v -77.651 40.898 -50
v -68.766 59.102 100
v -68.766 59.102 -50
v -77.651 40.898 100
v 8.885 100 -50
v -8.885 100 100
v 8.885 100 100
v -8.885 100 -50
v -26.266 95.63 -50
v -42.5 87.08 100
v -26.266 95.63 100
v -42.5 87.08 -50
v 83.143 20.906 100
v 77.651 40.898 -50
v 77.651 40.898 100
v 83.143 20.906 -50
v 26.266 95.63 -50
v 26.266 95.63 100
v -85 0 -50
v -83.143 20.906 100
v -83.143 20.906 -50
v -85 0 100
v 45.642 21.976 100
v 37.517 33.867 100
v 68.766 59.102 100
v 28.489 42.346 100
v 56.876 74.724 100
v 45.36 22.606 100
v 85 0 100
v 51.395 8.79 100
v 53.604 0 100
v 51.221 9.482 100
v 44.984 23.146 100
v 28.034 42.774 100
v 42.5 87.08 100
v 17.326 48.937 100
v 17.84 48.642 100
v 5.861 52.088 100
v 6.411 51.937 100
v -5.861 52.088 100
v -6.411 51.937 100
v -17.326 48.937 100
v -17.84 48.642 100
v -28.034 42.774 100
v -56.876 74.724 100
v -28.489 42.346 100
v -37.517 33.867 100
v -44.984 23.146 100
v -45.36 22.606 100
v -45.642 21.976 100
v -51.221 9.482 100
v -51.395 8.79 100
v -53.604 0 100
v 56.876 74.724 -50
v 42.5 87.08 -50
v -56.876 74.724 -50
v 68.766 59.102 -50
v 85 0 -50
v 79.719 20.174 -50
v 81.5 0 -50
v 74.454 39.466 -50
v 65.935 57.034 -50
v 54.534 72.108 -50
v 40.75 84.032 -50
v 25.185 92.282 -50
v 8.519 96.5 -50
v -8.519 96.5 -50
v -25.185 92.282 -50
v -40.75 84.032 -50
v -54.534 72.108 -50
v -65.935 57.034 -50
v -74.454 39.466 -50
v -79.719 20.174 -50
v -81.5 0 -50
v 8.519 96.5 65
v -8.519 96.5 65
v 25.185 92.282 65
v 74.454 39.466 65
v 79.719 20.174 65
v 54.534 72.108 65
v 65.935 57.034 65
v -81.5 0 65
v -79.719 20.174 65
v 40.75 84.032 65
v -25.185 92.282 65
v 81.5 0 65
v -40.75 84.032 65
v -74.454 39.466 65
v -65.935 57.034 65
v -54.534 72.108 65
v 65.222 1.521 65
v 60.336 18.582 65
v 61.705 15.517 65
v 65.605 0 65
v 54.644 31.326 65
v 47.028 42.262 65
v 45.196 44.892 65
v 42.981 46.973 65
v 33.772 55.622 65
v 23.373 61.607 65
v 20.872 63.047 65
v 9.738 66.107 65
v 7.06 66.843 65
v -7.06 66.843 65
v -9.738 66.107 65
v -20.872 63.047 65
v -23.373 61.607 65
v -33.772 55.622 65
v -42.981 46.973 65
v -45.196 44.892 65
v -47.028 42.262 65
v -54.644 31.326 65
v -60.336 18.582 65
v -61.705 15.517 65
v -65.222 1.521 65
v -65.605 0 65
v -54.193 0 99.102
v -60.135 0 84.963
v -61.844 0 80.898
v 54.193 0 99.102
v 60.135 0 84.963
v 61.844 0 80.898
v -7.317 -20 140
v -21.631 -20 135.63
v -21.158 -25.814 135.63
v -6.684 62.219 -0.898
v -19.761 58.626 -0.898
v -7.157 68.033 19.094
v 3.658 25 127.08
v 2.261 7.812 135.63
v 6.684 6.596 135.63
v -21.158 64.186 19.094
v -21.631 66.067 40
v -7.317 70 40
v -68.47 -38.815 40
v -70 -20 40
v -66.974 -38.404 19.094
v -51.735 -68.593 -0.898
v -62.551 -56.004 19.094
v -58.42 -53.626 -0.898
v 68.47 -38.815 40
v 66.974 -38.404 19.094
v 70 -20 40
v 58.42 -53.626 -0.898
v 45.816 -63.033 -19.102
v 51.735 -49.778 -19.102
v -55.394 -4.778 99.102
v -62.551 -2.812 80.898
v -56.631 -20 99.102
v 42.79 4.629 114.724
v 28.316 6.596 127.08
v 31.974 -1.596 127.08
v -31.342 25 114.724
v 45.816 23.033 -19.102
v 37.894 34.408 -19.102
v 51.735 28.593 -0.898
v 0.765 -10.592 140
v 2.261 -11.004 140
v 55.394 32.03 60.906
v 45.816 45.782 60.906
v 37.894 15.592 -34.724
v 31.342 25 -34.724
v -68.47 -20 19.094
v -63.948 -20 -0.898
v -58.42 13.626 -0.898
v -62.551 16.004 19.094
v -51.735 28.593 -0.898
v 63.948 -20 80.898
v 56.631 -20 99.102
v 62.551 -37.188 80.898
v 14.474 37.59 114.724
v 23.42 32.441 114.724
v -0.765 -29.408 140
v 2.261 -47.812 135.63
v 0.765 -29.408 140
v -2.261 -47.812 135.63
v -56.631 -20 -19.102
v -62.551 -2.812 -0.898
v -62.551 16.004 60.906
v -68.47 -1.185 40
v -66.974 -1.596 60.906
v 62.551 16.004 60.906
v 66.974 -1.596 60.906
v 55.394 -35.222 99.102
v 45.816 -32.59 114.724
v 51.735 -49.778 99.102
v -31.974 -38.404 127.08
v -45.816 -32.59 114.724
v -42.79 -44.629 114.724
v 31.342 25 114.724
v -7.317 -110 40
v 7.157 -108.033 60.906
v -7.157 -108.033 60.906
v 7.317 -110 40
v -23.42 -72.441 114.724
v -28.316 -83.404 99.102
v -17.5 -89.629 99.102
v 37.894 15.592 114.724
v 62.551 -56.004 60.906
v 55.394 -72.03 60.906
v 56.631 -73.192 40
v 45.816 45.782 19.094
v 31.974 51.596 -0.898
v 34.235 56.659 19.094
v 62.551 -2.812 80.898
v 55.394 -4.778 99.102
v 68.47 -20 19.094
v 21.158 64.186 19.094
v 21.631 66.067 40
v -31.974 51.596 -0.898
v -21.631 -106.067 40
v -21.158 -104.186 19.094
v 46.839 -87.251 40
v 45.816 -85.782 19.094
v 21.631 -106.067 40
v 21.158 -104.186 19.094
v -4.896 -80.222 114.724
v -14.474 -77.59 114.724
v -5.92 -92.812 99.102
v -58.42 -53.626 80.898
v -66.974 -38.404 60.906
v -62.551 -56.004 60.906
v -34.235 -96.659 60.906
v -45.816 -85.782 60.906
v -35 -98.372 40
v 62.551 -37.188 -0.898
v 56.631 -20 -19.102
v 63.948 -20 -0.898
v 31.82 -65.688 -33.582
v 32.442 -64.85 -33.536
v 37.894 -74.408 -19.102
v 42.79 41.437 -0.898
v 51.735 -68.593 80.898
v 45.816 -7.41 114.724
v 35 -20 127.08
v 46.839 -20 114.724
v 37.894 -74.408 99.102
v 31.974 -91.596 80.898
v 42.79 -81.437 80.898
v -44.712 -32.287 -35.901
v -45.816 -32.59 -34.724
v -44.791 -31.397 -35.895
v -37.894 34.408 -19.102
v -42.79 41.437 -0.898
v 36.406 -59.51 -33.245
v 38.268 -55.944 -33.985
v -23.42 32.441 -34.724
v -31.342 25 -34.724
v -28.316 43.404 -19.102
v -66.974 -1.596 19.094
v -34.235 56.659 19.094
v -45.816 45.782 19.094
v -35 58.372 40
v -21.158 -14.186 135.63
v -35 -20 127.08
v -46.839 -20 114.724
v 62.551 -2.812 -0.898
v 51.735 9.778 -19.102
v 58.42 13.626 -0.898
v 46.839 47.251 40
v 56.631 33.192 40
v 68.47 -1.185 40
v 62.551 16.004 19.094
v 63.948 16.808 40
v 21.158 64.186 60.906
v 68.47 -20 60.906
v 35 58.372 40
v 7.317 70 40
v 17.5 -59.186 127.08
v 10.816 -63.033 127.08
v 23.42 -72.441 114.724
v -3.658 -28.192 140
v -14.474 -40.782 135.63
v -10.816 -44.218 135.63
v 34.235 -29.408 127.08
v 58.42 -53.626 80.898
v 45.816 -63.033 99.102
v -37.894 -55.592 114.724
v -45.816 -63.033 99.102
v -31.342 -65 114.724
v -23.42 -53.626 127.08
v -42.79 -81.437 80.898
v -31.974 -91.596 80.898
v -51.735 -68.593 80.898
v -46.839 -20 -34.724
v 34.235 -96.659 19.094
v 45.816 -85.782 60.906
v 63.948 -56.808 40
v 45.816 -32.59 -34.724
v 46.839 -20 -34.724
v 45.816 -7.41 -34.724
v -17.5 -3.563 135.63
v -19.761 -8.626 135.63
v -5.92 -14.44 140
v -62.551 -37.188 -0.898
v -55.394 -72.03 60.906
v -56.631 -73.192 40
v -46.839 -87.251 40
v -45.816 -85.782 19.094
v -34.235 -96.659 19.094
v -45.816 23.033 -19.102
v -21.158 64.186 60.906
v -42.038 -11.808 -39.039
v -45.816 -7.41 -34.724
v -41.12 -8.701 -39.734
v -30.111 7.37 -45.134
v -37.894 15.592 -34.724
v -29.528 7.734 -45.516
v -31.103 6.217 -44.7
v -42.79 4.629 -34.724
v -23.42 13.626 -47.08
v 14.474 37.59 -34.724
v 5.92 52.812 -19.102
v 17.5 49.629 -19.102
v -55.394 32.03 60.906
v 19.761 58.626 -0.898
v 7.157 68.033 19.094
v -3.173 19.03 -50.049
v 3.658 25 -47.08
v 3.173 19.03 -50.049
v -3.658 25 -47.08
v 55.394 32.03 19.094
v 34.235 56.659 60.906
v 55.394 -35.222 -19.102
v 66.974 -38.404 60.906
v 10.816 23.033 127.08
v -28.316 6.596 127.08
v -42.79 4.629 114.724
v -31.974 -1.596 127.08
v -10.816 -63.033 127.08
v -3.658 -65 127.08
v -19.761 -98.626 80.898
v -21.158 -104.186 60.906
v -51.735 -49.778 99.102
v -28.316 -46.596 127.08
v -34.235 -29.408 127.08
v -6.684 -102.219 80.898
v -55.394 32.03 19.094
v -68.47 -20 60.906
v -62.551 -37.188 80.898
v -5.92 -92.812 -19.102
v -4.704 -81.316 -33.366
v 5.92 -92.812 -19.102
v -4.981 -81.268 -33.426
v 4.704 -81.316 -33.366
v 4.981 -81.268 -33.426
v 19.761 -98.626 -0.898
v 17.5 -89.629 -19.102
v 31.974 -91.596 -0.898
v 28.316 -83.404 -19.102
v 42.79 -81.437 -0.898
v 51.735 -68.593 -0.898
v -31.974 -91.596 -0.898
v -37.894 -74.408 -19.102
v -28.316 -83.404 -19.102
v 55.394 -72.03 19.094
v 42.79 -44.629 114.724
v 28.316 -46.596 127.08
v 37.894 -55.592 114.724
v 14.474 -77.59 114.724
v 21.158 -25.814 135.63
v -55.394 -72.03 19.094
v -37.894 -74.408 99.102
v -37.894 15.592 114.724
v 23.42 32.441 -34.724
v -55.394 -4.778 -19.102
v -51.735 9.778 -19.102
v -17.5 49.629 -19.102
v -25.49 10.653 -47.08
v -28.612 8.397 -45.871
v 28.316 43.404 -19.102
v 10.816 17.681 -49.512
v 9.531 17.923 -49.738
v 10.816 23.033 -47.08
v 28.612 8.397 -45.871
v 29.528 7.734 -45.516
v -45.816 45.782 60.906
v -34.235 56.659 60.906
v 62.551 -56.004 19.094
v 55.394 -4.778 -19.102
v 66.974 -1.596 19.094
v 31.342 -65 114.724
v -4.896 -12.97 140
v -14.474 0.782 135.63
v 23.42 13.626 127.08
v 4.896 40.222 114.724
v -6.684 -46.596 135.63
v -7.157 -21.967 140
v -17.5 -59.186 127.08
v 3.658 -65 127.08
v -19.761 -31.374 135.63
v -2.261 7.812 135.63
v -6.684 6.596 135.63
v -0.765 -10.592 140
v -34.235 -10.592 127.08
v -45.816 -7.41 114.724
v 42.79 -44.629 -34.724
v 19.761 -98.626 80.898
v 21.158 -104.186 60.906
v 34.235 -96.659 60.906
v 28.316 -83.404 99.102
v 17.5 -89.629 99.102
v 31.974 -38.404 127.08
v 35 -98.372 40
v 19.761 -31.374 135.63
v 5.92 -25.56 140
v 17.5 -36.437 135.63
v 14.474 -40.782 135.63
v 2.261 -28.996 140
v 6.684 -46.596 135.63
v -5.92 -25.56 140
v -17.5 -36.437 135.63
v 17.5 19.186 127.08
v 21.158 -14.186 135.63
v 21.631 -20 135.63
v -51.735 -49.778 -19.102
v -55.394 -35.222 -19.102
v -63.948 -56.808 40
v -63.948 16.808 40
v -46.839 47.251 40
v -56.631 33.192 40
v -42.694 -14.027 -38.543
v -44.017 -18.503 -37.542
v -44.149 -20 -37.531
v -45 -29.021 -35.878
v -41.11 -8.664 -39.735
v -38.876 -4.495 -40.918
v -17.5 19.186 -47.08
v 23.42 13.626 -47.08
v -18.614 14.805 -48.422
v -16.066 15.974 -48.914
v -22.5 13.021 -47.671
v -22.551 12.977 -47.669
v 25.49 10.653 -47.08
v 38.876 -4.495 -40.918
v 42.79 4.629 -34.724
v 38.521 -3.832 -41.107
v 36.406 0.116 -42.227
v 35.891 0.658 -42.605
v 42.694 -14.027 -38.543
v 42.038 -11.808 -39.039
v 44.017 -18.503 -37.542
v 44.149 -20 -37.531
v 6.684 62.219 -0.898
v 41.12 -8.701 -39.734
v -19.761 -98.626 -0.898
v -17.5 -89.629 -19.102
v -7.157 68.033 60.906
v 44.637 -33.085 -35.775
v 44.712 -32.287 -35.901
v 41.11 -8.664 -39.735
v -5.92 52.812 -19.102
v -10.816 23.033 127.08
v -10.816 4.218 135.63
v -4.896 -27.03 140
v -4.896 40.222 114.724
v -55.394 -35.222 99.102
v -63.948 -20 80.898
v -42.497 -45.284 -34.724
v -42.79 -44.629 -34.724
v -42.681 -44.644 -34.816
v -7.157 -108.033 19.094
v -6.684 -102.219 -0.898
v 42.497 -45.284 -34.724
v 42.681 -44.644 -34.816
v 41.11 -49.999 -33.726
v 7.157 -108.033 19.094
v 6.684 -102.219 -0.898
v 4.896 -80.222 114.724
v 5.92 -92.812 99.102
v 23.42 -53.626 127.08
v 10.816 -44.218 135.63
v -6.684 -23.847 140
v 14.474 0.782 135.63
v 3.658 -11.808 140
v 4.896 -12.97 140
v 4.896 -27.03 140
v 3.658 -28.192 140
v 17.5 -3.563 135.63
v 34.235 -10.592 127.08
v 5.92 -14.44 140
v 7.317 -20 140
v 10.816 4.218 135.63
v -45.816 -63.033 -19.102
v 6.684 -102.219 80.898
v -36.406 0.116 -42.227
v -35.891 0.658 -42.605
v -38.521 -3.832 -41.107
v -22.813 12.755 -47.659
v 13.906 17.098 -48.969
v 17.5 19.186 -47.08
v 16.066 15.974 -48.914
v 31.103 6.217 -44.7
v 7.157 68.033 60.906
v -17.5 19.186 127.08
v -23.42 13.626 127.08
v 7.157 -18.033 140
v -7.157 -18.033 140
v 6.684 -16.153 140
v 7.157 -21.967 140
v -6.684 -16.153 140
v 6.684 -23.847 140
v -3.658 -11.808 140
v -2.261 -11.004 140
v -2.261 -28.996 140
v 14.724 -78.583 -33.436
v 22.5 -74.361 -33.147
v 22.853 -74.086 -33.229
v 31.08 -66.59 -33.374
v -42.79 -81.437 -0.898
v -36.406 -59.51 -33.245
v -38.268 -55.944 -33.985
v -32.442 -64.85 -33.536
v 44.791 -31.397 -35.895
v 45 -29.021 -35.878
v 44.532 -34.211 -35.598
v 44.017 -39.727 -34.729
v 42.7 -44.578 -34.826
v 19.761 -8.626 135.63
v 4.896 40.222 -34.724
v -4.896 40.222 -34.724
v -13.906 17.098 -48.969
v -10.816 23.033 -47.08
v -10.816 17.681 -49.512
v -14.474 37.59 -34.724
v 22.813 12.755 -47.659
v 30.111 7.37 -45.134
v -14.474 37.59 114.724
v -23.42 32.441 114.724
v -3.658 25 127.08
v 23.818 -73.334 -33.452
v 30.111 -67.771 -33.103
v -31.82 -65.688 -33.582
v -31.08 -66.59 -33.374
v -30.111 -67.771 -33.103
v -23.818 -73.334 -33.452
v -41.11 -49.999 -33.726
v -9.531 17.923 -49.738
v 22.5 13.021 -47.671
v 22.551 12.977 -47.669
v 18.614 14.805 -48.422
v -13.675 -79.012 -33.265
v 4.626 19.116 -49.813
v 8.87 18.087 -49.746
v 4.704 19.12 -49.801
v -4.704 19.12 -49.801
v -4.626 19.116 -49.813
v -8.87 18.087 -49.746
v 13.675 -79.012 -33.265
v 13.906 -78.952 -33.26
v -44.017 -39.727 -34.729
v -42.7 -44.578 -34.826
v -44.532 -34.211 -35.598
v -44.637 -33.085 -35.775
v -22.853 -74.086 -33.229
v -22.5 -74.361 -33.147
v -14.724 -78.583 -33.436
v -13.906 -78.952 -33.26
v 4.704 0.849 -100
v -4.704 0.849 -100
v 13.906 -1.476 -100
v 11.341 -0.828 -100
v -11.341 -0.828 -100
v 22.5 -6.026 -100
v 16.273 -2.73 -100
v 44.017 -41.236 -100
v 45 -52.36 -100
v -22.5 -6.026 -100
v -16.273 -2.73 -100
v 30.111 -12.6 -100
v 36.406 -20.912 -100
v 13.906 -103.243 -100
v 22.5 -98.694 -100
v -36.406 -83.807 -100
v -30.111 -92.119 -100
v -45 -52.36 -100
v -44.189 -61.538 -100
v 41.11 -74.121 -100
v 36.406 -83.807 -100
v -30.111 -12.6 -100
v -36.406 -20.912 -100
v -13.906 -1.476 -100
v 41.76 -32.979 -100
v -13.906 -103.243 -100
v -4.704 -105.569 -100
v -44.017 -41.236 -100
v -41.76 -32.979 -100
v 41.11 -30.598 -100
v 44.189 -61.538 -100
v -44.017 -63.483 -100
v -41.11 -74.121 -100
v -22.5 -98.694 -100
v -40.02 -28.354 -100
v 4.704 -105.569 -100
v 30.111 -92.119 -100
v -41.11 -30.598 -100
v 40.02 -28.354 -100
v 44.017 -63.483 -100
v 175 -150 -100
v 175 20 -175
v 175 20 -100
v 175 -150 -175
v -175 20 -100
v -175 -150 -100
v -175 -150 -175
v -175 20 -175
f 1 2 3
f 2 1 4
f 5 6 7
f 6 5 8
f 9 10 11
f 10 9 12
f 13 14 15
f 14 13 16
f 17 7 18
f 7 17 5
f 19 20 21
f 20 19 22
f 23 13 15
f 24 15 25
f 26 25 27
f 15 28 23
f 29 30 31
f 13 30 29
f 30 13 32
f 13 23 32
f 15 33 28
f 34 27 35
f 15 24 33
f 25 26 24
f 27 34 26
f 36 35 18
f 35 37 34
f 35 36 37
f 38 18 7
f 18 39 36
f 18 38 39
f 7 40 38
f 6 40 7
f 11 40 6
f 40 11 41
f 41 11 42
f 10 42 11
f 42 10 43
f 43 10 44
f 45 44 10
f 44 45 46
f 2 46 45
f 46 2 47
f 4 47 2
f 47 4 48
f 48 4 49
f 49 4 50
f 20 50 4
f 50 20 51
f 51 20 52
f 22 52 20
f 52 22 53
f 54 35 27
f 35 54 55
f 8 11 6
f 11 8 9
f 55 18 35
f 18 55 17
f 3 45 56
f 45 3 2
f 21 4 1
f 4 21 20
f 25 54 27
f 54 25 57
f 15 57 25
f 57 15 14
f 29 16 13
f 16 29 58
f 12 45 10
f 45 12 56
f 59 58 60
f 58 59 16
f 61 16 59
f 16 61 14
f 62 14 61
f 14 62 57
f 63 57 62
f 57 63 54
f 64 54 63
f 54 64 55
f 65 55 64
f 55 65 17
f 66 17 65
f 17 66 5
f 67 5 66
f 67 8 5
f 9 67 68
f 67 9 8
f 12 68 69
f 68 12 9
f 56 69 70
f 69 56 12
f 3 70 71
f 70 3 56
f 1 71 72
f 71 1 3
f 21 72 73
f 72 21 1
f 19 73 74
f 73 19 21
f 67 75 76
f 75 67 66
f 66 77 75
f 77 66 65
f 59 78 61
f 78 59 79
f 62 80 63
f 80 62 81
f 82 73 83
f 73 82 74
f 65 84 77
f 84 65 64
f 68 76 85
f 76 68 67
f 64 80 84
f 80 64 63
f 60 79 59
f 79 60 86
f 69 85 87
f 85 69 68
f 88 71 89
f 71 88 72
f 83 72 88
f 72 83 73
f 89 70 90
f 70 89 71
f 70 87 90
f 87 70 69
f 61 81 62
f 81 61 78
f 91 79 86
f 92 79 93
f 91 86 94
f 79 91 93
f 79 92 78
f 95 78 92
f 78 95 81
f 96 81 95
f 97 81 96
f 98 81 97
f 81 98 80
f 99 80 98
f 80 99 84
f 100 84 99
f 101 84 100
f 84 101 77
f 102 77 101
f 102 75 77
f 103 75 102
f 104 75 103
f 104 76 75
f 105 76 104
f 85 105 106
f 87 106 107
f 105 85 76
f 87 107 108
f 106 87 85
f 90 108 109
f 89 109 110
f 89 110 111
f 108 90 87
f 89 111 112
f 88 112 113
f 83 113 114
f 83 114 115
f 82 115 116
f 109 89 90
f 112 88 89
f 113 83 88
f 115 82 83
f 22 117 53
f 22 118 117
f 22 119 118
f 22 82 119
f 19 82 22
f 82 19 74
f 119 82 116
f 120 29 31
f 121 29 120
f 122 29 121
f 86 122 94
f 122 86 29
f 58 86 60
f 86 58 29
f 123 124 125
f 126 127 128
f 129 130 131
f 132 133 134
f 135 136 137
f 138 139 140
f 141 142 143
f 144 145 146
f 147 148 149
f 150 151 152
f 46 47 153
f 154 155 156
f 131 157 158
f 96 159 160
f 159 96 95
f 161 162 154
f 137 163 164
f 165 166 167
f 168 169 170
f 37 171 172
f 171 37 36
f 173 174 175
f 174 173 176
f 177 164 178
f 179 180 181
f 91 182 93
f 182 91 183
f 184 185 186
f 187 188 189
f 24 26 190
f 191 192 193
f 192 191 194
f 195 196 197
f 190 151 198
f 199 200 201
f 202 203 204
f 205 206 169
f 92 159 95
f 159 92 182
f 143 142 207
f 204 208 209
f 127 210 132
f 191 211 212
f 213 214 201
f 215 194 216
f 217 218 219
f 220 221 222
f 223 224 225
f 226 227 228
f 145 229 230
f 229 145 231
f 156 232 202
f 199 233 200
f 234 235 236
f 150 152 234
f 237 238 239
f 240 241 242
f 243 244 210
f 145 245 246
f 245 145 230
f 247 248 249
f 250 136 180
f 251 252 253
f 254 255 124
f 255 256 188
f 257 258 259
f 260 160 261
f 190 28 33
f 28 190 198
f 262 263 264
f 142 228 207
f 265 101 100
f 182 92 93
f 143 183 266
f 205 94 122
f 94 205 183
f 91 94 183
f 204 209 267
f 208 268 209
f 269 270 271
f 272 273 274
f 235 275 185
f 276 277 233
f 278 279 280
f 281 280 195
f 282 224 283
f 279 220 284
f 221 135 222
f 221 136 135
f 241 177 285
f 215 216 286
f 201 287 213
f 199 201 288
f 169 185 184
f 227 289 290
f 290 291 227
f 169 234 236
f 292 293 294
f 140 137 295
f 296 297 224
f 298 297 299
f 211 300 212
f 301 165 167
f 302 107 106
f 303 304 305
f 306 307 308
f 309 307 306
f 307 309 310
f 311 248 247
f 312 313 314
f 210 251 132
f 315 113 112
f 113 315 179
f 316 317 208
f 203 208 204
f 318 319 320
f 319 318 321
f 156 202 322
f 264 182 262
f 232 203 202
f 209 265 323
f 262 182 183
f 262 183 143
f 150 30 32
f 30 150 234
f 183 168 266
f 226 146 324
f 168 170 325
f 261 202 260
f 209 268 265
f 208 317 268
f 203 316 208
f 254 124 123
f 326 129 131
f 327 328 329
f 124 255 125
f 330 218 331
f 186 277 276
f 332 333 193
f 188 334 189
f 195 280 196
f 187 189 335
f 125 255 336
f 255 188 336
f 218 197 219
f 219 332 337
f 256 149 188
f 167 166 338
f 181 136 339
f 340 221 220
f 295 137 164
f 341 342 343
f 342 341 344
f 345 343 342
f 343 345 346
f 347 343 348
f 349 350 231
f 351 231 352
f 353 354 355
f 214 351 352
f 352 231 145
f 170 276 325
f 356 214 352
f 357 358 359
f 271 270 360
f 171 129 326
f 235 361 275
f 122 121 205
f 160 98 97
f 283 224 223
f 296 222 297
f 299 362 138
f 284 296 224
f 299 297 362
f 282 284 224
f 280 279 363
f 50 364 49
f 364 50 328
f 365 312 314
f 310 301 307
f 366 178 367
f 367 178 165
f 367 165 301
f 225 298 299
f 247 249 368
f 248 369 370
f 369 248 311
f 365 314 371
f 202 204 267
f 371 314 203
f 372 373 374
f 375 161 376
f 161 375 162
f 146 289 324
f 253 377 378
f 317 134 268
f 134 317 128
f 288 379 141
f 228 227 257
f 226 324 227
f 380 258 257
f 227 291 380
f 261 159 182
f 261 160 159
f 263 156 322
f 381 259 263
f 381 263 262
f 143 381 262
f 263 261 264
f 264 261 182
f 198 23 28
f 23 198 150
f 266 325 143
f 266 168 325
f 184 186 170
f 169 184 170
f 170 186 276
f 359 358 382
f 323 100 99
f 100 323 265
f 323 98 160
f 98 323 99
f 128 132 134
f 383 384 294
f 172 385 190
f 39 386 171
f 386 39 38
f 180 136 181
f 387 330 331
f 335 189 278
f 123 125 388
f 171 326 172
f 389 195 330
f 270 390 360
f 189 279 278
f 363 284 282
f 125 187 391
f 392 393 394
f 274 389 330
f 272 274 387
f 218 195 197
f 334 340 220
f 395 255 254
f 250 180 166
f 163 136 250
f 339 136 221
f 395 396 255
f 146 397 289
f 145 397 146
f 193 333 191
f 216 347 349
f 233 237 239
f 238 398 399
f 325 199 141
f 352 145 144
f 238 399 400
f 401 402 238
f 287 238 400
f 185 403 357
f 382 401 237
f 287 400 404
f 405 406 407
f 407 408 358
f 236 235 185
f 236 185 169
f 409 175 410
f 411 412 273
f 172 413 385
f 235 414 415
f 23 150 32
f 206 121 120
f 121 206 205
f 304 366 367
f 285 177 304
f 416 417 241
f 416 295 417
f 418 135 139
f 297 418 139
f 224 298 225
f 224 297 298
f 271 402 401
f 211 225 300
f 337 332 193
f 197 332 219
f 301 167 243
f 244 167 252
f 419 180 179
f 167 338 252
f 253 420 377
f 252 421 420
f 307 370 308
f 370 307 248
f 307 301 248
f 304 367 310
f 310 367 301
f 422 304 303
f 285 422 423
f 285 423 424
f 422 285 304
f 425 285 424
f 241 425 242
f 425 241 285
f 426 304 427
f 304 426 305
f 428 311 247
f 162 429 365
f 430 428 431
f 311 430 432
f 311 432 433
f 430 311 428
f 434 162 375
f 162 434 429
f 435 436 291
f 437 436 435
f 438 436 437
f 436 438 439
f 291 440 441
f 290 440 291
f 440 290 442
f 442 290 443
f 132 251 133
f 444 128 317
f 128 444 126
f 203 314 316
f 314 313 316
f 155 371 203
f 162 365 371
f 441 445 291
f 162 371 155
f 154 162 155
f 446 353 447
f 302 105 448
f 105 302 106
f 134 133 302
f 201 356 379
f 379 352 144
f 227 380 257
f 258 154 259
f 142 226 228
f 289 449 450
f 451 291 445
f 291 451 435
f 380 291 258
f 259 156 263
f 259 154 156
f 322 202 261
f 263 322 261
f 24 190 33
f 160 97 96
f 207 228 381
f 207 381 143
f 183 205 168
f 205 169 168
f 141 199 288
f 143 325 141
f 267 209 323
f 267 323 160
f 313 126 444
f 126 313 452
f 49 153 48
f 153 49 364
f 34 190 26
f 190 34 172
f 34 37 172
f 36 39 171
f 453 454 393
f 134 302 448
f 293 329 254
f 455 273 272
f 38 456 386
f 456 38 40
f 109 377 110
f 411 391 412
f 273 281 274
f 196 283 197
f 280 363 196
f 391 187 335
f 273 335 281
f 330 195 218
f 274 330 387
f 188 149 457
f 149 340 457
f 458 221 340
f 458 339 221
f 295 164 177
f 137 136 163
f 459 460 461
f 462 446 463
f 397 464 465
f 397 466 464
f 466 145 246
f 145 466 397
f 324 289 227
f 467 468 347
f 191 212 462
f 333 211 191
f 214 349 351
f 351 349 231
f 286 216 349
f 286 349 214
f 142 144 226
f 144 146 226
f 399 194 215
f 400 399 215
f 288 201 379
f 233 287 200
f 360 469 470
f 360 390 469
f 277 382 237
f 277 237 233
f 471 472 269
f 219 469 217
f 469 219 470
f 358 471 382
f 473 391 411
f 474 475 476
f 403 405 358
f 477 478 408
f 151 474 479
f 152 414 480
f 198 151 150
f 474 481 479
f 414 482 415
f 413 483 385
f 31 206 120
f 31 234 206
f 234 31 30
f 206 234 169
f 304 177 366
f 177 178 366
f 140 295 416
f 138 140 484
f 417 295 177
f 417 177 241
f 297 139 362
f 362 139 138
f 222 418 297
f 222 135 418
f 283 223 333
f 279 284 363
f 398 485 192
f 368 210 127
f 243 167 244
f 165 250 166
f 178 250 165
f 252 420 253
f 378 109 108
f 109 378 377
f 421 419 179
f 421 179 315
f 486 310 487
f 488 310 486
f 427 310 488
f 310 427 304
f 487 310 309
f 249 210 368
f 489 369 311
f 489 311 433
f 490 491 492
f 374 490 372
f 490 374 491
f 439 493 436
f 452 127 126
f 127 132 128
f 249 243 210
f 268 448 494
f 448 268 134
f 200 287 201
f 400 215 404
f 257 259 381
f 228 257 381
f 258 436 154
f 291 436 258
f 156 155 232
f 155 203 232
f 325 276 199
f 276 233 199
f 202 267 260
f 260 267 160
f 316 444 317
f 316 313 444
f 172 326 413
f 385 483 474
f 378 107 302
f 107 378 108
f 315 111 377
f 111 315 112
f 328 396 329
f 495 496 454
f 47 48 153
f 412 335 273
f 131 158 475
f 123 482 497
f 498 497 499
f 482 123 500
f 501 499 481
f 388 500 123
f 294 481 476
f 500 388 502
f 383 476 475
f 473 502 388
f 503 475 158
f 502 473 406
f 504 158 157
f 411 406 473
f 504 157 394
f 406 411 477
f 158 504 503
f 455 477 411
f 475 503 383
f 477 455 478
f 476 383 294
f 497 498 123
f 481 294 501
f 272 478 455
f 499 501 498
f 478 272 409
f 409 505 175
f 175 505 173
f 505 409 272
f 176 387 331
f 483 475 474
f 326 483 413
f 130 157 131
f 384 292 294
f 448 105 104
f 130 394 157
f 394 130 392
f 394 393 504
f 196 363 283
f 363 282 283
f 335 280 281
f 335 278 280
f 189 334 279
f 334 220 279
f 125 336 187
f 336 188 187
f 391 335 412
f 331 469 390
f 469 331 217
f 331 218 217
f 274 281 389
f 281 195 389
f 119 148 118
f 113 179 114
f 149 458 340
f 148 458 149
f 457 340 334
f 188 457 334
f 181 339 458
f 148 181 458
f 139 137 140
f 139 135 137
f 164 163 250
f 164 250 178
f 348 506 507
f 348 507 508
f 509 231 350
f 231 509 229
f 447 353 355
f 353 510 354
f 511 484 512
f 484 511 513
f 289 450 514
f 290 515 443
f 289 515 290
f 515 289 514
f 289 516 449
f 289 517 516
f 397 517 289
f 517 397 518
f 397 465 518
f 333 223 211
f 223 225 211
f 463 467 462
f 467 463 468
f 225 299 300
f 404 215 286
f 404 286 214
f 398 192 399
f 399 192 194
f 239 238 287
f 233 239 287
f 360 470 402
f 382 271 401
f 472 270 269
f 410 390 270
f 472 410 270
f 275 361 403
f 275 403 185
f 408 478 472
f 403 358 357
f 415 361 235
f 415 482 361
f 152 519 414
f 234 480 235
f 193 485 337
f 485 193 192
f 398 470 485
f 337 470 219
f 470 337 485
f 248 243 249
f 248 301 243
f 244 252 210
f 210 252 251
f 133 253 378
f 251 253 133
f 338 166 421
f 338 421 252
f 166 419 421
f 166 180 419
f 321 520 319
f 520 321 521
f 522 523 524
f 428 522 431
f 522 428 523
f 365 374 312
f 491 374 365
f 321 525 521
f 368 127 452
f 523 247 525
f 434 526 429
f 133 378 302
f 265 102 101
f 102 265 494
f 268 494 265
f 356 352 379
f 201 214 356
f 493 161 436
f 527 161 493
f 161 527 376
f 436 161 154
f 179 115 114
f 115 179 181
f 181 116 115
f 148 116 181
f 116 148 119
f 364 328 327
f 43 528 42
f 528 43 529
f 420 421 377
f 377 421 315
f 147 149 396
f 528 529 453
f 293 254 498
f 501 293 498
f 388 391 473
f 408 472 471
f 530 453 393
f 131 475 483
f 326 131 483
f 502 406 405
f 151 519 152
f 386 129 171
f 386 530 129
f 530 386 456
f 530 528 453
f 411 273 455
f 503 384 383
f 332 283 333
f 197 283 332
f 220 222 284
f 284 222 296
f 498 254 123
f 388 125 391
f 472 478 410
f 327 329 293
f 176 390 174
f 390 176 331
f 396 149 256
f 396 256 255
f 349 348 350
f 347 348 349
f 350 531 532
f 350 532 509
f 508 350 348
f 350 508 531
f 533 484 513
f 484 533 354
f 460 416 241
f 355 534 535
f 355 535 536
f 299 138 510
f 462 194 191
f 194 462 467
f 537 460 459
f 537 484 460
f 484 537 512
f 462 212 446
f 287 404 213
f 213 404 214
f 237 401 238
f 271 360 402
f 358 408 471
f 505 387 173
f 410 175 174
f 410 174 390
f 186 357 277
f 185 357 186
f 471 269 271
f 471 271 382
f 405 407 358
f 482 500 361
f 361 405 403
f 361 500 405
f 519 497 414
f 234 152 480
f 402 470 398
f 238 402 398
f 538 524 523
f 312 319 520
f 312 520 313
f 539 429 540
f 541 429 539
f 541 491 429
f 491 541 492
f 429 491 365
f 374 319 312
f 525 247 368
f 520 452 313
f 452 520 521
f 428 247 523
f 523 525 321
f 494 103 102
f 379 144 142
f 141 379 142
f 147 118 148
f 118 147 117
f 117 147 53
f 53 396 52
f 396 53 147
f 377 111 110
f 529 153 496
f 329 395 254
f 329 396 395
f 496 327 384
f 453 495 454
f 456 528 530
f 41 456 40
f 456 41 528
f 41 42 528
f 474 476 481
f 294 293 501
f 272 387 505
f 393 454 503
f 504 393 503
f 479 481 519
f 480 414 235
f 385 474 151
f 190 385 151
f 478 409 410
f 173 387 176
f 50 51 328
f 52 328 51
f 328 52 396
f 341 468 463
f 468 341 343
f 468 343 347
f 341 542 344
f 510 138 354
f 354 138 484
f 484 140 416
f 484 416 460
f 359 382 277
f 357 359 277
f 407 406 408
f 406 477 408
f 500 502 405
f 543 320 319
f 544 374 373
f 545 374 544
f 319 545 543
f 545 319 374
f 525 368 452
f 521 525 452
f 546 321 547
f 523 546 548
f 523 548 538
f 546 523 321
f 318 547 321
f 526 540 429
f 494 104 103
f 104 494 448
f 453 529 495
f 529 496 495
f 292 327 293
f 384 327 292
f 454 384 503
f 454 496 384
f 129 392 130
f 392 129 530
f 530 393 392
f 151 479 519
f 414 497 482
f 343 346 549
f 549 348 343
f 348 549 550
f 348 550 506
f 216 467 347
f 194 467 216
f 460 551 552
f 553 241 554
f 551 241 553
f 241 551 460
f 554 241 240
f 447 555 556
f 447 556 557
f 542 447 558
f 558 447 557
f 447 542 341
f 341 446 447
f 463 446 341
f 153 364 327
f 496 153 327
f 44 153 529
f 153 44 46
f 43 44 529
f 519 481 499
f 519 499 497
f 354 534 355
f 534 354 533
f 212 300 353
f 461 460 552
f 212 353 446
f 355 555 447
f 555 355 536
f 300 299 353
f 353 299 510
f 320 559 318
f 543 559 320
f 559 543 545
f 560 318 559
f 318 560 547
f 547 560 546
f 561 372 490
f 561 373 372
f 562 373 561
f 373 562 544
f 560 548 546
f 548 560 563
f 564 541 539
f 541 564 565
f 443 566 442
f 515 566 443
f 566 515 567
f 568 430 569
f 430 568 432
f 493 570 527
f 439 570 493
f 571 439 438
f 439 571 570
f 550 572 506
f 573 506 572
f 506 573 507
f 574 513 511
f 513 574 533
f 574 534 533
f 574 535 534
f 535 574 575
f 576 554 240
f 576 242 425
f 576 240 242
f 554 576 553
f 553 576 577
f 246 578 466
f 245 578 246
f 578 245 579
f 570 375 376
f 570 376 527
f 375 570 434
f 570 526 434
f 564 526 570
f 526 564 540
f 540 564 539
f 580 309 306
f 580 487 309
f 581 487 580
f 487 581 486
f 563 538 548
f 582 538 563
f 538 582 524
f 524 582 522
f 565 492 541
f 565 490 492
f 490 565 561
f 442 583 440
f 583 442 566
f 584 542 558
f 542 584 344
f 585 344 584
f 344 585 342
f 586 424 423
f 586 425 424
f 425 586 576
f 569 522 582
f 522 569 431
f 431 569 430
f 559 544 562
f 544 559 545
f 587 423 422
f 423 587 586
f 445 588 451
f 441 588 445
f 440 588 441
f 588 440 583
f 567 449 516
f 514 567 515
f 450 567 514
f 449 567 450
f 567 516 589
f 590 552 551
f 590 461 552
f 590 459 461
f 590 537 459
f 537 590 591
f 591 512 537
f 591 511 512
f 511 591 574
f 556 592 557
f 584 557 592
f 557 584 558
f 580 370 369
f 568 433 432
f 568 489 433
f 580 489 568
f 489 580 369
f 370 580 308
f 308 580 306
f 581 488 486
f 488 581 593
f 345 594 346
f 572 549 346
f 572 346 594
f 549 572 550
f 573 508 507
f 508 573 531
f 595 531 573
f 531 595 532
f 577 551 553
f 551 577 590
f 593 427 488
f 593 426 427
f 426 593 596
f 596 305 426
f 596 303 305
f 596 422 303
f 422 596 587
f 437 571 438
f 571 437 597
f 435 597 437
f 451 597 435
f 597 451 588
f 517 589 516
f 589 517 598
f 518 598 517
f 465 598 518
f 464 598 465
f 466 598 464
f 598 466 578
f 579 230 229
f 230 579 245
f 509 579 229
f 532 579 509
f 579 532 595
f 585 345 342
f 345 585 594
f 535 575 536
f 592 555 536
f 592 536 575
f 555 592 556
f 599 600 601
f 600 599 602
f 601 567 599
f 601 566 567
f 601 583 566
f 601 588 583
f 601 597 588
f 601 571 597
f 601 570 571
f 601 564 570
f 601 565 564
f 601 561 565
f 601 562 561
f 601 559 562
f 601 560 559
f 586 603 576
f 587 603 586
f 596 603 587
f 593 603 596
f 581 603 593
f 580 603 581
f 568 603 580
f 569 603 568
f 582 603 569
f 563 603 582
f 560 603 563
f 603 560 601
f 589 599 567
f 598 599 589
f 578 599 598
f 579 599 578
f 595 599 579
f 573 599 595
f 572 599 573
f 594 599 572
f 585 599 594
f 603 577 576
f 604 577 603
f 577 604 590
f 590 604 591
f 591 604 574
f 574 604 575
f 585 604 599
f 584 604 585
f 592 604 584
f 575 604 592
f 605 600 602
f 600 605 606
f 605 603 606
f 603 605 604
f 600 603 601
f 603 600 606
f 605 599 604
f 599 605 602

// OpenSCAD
union() {

    difference() {
        
        union() {
        
            difference() {
                // shield front
                translate([0,0,-50])
                    linear_extrude(height=150)
                        resize([170,200])
                            circle(d=100);
                
                // shield back
                translate([0,0,-200])
                    linear_extrude(height=400)
                        resize([163,193])
                            circle(d=50);
            }
            
            // connection
            translate([0,0,65])
                linear_extrude(height=35) // make connection flush with top of shield (not recessed down)
                    resize([163,193])
                        circle(d=100);
        }
        
        // remove half of entities above
        translate([-150,-300,-150])
            cube(300);  

    }

    // head
    translate([0,-20,40])
        resize(newsize=[140,180,200]) 
            sphere(r=100);
    
    // neck
    rotate([-20,0,0])
        translate([0,-15,-150])
            linear_extrude(height=200)
                resize([90,100])
                    circle(d=100);
    
    // body
    translate([-175,-150,-175])
        cube([350,170, 75]);
}
